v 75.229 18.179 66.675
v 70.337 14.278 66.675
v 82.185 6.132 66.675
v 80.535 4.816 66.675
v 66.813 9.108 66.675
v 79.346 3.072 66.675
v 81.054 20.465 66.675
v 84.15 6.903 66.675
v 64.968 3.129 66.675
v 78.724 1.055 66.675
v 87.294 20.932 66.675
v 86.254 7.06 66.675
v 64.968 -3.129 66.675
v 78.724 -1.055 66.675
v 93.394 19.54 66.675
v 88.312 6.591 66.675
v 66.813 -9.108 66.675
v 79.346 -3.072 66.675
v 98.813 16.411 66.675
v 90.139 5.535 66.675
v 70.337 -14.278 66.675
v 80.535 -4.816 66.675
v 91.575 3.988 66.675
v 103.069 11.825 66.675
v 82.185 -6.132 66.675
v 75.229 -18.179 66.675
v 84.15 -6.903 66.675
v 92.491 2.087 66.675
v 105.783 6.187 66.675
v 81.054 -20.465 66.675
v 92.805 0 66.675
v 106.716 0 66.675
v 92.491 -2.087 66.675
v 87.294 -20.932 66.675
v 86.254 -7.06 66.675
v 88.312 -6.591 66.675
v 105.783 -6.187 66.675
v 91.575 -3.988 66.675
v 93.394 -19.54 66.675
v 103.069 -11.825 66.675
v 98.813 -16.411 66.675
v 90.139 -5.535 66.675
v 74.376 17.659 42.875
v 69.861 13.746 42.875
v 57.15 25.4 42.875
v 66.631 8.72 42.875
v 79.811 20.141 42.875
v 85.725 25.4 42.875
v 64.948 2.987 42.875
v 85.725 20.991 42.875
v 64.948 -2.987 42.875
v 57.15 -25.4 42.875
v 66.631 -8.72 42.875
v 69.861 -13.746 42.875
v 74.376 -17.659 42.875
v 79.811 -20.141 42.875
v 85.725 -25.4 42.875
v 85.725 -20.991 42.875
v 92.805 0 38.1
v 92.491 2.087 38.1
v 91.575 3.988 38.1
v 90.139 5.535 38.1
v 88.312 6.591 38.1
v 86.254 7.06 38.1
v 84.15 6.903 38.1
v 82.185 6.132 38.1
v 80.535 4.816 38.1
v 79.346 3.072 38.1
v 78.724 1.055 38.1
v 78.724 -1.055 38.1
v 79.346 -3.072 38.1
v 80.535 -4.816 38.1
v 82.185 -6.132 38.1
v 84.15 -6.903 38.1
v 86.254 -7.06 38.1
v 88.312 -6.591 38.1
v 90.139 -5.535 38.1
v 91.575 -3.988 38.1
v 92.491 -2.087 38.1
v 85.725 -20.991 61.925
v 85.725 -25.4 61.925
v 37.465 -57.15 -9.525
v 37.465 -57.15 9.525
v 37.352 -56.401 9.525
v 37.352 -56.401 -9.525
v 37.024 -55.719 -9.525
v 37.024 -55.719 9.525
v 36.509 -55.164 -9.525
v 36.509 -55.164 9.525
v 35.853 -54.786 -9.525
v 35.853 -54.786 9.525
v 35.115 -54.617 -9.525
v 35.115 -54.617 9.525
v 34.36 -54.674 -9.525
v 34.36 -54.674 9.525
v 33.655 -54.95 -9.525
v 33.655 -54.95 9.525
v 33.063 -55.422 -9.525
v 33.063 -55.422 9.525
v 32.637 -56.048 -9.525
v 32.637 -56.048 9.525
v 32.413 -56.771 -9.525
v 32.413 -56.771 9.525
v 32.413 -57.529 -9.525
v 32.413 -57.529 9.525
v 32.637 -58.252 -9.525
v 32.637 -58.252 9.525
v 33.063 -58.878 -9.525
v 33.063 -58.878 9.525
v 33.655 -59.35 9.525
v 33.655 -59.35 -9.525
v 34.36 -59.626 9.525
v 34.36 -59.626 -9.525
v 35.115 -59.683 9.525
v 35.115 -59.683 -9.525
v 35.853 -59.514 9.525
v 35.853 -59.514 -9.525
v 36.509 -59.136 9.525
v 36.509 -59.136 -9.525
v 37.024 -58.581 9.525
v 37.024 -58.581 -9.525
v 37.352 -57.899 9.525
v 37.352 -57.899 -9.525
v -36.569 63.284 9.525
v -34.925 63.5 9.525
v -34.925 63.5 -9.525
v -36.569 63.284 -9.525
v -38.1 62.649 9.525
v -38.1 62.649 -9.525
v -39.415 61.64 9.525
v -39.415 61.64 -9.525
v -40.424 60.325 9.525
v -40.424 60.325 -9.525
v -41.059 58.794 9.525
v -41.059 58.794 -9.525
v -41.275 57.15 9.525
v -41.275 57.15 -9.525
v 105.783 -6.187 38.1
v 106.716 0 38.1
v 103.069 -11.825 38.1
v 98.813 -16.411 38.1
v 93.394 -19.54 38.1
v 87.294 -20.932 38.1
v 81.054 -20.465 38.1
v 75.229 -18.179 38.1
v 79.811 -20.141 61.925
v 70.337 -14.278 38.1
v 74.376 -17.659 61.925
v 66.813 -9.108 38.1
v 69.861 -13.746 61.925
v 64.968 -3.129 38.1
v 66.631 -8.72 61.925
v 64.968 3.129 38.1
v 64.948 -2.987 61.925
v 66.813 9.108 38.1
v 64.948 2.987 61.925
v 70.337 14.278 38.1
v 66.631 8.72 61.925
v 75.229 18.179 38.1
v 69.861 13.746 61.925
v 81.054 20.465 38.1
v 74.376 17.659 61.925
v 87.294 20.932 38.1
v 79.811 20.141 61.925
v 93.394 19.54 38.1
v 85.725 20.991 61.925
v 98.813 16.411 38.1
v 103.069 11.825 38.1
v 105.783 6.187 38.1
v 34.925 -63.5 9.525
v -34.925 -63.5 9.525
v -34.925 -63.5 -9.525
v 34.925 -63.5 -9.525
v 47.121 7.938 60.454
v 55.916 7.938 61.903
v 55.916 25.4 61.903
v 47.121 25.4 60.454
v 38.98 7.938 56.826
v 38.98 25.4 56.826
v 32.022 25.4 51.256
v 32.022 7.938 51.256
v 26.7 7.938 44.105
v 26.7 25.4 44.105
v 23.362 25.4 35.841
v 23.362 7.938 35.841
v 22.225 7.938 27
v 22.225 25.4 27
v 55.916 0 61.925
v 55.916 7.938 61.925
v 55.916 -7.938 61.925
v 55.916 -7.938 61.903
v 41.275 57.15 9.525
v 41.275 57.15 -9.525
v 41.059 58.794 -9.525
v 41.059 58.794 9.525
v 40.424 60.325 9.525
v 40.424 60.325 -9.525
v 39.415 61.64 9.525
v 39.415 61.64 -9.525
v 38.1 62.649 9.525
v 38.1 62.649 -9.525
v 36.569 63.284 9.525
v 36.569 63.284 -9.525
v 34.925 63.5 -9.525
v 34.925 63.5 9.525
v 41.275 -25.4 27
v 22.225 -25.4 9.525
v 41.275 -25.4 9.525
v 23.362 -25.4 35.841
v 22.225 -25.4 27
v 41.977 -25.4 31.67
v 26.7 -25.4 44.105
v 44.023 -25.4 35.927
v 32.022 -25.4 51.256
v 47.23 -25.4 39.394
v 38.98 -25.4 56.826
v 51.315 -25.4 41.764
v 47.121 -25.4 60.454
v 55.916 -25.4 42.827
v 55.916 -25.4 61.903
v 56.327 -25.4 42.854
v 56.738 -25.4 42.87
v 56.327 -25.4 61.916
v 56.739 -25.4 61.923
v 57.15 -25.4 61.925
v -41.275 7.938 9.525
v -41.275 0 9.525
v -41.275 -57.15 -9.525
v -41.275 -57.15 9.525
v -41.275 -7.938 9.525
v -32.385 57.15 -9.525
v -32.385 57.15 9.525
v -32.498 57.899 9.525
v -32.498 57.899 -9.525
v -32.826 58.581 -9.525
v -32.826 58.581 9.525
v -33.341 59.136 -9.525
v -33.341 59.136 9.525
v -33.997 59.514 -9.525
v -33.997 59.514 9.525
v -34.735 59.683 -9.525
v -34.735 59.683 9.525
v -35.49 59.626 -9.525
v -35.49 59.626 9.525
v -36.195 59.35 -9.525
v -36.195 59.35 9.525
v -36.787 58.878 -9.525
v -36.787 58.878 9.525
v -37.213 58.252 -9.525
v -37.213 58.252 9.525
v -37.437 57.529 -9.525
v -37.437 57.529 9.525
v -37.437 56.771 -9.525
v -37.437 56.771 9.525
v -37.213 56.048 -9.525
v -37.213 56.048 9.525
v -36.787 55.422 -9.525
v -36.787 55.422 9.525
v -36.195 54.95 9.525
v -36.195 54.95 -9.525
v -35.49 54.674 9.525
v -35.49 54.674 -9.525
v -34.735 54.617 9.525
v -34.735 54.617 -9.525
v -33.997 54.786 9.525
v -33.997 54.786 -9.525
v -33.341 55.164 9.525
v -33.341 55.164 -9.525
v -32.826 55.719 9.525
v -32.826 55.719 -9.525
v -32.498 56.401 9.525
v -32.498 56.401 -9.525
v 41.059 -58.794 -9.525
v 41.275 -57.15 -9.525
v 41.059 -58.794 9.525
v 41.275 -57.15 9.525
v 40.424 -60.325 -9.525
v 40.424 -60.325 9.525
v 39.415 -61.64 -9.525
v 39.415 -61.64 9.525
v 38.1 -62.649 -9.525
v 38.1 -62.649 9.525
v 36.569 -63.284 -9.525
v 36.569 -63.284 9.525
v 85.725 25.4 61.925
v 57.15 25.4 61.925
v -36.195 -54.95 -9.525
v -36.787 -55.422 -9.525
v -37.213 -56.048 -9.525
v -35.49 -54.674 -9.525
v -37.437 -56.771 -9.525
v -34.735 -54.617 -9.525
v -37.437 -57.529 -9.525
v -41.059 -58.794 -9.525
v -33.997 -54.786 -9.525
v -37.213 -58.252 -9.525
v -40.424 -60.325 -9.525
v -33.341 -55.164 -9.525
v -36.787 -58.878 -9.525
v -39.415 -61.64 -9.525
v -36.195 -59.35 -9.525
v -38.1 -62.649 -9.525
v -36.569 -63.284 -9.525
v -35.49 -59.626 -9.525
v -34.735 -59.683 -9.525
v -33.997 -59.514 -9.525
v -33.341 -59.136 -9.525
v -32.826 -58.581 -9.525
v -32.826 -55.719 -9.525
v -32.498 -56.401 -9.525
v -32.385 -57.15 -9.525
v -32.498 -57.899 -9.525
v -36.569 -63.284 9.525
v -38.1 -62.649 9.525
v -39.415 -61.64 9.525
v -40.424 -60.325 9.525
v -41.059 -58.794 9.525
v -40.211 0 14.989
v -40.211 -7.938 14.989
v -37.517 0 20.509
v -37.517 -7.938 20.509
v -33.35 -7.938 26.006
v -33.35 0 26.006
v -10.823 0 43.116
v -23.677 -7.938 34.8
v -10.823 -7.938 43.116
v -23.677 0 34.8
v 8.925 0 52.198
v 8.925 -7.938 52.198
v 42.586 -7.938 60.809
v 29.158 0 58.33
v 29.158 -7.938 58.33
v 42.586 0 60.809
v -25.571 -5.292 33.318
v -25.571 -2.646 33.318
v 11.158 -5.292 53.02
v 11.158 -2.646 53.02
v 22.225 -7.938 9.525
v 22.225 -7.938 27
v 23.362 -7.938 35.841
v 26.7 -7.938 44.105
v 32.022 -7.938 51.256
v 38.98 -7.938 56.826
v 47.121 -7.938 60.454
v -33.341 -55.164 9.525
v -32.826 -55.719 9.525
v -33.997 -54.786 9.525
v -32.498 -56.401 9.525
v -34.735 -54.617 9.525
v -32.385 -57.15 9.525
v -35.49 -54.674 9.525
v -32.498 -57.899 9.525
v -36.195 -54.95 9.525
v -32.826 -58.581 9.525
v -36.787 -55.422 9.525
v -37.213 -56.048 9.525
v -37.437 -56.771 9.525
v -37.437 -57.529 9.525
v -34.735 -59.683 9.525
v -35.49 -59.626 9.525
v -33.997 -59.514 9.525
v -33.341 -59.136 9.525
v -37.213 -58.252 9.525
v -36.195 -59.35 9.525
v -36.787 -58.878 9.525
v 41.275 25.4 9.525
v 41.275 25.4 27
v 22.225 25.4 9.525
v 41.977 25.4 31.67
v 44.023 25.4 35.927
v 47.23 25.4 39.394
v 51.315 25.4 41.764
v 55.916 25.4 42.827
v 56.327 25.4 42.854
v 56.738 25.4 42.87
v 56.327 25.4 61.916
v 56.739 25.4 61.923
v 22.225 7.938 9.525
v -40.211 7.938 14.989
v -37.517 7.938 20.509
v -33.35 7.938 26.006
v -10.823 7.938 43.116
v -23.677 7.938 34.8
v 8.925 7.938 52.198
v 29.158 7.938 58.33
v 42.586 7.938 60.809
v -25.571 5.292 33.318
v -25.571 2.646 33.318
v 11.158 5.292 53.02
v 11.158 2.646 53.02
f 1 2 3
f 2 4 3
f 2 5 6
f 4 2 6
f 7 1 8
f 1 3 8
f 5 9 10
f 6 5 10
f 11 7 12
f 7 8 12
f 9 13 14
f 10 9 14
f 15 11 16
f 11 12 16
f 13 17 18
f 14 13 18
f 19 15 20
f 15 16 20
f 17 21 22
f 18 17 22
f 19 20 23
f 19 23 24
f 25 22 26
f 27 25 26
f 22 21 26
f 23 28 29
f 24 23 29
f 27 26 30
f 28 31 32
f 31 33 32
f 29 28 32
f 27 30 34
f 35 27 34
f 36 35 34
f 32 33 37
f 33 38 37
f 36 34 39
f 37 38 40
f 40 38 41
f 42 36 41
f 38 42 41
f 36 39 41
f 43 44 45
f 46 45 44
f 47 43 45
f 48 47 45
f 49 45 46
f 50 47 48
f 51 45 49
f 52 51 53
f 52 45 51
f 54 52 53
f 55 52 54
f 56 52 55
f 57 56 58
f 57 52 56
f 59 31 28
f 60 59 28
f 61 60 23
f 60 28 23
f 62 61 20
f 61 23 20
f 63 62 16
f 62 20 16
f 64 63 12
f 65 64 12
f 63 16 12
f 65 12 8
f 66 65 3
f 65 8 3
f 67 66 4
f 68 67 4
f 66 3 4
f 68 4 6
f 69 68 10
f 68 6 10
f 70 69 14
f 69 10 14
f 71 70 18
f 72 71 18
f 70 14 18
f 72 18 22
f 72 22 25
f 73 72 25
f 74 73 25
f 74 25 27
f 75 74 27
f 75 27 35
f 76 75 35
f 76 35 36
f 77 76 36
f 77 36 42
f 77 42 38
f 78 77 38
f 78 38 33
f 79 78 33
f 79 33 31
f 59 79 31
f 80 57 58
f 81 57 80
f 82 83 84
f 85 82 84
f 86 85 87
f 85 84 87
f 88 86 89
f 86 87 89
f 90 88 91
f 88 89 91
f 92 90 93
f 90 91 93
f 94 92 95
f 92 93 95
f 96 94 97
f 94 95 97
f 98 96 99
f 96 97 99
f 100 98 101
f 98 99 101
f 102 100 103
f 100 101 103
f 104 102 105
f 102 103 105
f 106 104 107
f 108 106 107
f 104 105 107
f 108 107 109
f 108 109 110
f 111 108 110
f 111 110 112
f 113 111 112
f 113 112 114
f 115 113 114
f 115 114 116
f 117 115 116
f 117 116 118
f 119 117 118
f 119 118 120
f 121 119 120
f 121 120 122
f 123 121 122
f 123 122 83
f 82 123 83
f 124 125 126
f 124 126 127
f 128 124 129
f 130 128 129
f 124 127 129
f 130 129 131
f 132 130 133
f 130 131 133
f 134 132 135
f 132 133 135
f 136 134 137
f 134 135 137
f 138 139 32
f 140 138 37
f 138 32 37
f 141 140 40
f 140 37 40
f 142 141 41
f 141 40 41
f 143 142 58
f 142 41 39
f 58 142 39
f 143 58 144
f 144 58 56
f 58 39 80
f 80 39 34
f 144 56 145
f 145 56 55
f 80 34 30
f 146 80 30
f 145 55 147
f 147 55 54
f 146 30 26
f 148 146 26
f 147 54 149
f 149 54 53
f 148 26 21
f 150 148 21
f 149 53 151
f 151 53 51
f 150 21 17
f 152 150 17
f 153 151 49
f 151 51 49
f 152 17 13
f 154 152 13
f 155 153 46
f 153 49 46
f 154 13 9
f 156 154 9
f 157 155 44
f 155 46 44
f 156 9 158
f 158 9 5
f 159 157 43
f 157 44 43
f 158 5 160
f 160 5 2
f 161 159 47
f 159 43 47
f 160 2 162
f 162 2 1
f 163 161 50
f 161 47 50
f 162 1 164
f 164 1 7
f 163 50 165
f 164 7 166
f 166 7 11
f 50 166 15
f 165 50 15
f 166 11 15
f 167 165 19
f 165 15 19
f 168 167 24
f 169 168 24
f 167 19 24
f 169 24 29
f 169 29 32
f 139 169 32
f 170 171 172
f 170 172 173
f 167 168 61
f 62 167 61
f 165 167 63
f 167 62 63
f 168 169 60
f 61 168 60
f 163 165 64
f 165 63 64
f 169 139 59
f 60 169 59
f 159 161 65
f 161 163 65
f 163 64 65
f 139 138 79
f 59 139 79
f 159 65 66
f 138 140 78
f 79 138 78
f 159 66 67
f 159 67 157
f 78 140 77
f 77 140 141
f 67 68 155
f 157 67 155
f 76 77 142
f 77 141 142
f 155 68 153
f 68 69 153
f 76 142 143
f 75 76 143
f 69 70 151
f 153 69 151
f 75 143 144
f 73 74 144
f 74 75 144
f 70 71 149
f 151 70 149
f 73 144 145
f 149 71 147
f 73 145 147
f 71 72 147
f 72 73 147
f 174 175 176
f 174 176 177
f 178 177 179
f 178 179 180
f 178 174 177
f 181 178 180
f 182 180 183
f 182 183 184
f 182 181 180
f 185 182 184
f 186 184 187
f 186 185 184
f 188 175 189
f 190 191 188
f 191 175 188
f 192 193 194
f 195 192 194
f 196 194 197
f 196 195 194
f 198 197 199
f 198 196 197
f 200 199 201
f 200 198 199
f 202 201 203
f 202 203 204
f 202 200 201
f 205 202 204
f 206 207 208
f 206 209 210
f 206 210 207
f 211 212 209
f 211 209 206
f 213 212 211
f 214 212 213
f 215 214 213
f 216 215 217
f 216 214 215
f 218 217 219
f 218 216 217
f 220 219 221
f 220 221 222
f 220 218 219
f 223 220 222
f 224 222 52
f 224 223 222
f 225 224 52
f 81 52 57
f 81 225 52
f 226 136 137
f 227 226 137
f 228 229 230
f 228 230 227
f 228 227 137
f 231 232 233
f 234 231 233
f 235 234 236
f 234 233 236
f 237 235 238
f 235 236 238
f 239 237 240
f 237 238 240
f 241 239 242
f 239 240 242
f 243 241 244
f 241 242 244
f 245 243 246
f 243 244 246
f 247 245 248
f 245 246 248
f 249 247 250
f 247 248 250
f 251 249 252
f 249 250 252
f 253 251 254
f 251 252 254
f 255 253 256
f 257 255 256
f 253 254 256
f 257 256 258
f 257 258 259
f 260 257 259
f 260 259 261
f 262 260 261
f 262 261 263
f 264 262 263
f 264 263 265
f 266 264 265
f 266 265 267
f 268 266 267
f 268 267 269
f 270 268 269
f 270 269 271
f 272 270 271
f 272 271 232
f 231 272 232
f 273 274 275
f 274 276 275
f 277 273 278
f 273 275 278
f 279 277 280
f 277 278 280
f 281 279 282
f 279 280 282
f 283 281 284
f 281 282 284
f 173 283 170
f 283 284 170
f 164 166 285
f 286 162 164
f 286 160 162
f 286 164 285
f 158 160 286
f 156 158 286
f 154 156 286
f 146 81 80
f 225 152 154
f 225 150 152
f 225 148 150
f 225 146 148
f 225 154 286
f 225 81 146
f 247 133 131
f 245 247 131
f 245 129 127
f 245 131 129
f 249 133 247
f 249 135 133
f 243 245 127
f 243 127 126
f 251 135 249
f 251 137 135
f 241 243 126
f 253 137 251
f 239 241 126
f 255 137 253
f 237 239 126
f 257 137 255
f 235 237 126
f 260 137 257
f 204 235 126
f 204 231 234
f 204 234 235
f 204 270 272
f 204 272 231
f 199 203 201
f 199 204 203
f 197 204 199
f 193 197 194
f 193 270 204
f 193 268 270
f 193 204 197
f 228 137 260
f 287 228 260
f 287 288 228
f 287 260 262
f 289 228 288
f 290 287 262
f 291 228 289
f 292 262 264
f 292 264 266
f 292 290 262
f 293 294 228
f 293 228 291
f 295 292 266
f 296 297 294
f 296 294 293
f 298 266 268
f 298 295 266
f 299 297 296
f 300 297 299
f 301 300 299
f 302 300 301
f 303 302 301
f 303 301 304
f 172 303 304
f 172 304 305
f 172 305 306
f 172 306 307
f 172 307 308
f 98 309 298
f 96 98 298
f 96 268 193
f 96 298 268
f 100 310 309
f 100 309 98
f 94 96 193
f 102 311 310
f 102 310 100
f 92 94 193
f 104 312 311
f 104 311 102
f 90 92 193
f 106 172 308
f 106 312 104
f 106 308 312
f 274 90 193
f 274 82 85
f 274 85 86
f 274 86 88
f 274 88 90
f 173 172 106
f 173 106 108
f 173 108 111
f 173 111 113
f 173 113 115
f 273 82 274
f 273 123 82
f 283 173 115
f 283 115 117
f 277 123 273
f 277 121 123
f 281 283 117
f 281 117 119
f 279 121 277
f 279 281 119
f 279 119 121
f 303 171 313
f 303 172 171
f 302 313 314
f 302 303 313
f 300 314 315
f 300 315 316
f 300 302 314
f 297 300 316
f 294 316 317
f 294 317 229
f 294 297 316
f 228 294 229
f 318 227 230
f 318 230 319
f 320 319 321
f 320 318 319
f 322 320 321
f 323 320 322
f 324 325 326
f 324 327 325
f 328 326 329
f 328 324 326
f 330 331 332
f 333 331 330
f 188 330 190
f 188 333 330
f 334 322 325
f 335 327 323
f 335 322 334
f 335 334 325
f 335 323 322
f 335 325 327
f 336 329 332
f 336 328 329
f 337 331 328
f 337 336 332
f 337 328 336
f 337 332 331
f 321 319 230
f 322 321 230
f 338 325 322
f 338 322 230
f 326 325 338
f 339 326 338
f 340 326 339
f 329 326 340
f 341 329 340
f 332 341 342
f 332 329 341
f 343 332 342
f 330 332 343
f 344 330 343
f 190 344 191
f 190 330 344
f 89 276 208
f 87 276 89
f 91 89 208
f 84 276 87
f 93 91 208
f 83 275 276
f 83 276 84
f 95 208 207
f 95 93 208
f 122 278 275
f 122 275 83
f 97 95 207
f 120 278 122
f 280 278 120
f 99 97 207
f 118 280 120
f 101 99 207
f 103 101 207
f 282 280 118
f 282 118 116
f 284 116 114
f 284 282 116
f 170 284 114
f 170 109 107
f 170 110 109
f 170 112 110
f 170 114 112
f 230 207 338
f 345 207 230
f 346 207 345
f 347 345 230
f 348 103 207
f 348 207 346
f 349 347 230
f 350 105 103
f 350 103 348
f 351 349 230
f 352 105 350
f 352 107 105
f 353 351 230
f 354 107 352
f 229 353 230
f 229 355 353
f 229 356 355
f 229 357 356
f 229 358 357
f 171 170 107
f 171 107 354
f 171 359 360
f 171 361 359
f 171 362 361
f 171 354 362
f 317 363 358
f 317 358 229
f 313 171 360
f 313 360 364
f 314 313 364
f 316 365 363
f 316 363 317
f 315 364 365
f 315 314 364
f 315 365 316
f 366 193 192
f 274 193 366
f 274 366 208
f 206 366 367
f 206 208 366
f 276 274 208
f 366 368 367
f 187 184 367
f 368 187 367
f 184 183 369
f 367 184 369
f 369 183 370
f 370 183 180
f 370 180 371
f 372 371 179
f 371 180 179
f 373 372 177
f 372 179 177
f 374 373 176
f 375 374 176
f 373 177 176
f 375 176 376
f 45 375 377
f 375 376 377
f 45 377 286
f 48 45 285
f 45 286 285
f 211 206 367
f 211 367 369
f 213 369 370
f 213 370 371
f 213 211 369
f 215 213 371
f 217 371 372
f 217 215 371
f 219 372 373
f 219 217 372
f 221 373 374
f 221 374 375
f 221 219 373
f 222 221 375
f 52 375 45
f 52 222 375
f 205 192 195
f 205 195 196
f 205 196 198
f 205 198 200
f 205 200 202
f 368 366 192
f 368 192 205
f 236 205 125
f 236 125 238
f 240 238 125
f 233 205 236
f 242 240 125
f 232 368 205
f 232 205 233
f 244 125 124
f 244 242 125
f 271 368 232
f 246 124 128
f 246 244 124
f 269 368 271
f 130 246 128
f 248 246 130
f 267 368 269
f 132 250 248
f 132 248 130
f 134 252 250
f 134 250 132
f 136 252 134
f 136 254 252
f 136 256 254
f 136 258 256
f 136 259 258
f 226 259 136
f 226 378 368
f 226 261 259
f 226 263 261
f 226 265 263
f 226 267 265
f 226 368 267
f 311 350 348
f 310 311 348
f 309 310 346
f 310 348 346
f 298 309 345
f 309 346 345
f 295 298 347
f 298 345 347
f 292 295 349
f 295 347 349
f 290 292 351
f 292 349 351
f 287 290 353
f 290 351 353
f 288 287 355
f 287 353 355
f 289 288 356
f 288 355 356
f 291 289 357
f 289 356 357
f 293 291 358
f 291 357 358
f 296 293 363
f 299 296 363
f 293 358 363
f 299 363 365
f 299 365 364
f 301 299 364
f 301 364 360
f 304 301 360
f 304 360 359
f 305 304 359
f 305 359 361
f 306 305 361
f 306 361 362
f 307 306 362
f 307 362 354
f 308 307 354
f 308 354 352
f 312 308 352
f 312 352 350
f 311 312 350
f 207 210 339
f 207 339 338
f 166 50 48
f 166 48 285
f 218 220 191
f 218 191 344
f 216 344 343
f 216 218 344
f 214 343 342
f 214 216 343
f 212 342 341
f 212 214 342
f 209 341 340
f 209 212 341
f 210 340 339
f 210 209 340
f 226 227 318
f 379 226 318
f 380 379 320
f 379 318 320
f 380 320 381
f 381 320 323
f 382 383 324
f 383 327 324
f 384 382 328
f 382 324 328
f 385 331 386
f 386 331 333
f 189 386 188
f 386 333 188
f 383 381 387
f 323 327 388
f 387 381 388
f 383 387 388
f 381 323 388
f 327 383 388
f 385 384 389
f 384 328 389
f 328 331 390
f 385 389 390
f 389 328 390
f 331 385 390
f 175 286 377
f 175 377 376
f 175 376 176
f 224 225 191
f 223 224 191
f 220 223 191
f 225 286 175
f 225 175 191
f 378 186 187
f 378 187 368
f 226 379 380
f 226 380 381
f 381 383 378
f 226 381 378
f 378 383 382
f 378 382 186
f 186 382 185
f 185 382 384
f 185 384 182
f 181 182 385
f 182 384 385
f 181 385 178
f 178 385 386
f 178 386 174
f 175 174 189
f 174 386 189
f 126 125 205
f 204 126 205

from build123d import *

# Parameters (mm, degrees)
F1_DEPTH  = 63.5
F2_DEPTH  = 25.4
F3_DEPTH  = 7.9375
F4_R      = 6.35
F6_R      = 7.0800960526
F7_DEPTH  = 34.544
F8_R      = 2.54
F9_DEPTH  = 25.4
F10_R     = 2.54
F11_DEPTH = 25.4
F12_DEPTH = 25.4


with BuildPart() as f1:
    # F0 (on Front) → F1 (new body, symmetric)
    with BuildSketch(Plane.XZ):
        Polygon((41.275, -9.525), (41.275, 9.525), (22.225, 9.525), (-41.275, 9.525), (-41.275, -9.525), align=None)
    extrude(amount=F1_DEPTH, both=True)

    # F0 (on Front) → F2 (join, symmetric)
    with BuildSketch(Plane.XZ):
        with BuildLine():
            Line((22.225, 9.525), (41.275, 9.525))
            Line((41.275, 9.525), (41.275, 27.0002))
            ThreePointArc((41.275, 27.0002), (45.4965819701, 37.7804353045), (55.9160674925, 42.827171775))
            Line((55.9160674925, 42.827171775), (55.9160674925, 61.9033952057))
            ThreePointArc((55.9160674925, 61.9033952057), (32.0218214167, 51.2557203219), (22.225, 27.0002))
            Line((22.225, 27.0002), (22.225, 9.525))
        make_face()
        with BuildLine():
            Line((55.9160674925, 61.9033952057), (55.9160674925, 42.827171775))
            ThreePointArc((55.9160674925, 42.827171775), (56.5325665737, 42.8631883995), (57.15, 42.8752))
            Line((57.15, 42.8752), (85.725, 42.8752))
            Line((85.725, 42.8752), (85.725, 61.9252))
            Line((85.725, 61.9252), (57.15, 61.9252))
            ThreePointArc((57.15, 61.9252), (56.5329374257, 61.9197483759), (55.9160674925, 61.9033952057))
        make_face()
    extrude(amount=F2_DEPTH, both=True)

    # F0 (on Front) → F3 (join, symmetric)
    with BuildSketch(Plane.XZ):
        with BuildLine():
            Line((-41.275, 9.525), (22.225, 9.525))
            Line((22.225, 9.525), (22.225, 27.0002))
            ThreePointArc((22.225, 27.0002), (32.0218214167, 51.2557203219), (55.9160674925, 61.9033952057))
            Line((55.9160674925, 61.9033952057), (55.9160674925, 61.9252))
            add(Edge.make_bspline(
                [(-41.275, 9.525), (-40.4172204435, 33.1299565732), (11.4771540301, 60.651878911), (55.9160674925, 61.9252)],
                knots=[0, 0, 0, 0, 110.4168671914, 110.4168671914, 110.4168671914, 110.4168671914], degree=3))
        make_face()
    extrude(amount=F3_DEPTH, both=True)

    # F4
    f4_edges = [f1.edges().sort_by_distance(p)[0] for p in [
        (41.275, -63.5, 0),
        (-41.275, -63.5, 0),
        (41.275, 63.5, 0),
        (-41.275, 63.5, 0),
    ]]
    fillet(f4_edges, radius=F4_R)

    # F0 (on Front) → F5 (revolve)
    with BuildSketch(Plane.XZ):
        Polygon((85.725, 42.8752), (85.725, 38.1), (106.7160674925, 38.1), (106.7160674925, 66.675), (85.725, 66.675), (85.725, 61.9252), align=None)
    revolve(axis=Axis((85.725, 0, 52.3875), (0, 0, -1)))

    # F6 (on face) → F7 (cut)
    with BuildSketch(Plane.XY.offset(66.675)):
        with Locations((85.725, 0)):
            Circle(F6_R)
    extrude(amount=-F7_DEPTH, mode=Mode.SUBTRACT)

    # F8 (on face) → F9 (cut)
    with BuildSketch(Plane.XY.offset(9.525)):
        with Locations((-34.925, -57.15)):
            Circle(F8_R)
    extrude(amount=-F9_DEPTH, mode=Mode.SUBTRACT)

    # F10 (on face) → F11 (cut)
    with BuildSketch(Plane.XY.offset(9.525)):
        with Locations((-34.925, 57.15)):
            Circle(F10_R)
    extrude(amount=-F11_DEPTH, mode=Mode.SUBTRACT)

    # F8 (on face) → F12 (cut)
    with BuildSketch(Plane.XY.offset(9.525)):
        with Locations((34.925, -57.15)):
            Circle(F8_R)
    extrude(amount=-F12_DEPTH, mode=Mode.SUBTRACT)


solid = f1.part
